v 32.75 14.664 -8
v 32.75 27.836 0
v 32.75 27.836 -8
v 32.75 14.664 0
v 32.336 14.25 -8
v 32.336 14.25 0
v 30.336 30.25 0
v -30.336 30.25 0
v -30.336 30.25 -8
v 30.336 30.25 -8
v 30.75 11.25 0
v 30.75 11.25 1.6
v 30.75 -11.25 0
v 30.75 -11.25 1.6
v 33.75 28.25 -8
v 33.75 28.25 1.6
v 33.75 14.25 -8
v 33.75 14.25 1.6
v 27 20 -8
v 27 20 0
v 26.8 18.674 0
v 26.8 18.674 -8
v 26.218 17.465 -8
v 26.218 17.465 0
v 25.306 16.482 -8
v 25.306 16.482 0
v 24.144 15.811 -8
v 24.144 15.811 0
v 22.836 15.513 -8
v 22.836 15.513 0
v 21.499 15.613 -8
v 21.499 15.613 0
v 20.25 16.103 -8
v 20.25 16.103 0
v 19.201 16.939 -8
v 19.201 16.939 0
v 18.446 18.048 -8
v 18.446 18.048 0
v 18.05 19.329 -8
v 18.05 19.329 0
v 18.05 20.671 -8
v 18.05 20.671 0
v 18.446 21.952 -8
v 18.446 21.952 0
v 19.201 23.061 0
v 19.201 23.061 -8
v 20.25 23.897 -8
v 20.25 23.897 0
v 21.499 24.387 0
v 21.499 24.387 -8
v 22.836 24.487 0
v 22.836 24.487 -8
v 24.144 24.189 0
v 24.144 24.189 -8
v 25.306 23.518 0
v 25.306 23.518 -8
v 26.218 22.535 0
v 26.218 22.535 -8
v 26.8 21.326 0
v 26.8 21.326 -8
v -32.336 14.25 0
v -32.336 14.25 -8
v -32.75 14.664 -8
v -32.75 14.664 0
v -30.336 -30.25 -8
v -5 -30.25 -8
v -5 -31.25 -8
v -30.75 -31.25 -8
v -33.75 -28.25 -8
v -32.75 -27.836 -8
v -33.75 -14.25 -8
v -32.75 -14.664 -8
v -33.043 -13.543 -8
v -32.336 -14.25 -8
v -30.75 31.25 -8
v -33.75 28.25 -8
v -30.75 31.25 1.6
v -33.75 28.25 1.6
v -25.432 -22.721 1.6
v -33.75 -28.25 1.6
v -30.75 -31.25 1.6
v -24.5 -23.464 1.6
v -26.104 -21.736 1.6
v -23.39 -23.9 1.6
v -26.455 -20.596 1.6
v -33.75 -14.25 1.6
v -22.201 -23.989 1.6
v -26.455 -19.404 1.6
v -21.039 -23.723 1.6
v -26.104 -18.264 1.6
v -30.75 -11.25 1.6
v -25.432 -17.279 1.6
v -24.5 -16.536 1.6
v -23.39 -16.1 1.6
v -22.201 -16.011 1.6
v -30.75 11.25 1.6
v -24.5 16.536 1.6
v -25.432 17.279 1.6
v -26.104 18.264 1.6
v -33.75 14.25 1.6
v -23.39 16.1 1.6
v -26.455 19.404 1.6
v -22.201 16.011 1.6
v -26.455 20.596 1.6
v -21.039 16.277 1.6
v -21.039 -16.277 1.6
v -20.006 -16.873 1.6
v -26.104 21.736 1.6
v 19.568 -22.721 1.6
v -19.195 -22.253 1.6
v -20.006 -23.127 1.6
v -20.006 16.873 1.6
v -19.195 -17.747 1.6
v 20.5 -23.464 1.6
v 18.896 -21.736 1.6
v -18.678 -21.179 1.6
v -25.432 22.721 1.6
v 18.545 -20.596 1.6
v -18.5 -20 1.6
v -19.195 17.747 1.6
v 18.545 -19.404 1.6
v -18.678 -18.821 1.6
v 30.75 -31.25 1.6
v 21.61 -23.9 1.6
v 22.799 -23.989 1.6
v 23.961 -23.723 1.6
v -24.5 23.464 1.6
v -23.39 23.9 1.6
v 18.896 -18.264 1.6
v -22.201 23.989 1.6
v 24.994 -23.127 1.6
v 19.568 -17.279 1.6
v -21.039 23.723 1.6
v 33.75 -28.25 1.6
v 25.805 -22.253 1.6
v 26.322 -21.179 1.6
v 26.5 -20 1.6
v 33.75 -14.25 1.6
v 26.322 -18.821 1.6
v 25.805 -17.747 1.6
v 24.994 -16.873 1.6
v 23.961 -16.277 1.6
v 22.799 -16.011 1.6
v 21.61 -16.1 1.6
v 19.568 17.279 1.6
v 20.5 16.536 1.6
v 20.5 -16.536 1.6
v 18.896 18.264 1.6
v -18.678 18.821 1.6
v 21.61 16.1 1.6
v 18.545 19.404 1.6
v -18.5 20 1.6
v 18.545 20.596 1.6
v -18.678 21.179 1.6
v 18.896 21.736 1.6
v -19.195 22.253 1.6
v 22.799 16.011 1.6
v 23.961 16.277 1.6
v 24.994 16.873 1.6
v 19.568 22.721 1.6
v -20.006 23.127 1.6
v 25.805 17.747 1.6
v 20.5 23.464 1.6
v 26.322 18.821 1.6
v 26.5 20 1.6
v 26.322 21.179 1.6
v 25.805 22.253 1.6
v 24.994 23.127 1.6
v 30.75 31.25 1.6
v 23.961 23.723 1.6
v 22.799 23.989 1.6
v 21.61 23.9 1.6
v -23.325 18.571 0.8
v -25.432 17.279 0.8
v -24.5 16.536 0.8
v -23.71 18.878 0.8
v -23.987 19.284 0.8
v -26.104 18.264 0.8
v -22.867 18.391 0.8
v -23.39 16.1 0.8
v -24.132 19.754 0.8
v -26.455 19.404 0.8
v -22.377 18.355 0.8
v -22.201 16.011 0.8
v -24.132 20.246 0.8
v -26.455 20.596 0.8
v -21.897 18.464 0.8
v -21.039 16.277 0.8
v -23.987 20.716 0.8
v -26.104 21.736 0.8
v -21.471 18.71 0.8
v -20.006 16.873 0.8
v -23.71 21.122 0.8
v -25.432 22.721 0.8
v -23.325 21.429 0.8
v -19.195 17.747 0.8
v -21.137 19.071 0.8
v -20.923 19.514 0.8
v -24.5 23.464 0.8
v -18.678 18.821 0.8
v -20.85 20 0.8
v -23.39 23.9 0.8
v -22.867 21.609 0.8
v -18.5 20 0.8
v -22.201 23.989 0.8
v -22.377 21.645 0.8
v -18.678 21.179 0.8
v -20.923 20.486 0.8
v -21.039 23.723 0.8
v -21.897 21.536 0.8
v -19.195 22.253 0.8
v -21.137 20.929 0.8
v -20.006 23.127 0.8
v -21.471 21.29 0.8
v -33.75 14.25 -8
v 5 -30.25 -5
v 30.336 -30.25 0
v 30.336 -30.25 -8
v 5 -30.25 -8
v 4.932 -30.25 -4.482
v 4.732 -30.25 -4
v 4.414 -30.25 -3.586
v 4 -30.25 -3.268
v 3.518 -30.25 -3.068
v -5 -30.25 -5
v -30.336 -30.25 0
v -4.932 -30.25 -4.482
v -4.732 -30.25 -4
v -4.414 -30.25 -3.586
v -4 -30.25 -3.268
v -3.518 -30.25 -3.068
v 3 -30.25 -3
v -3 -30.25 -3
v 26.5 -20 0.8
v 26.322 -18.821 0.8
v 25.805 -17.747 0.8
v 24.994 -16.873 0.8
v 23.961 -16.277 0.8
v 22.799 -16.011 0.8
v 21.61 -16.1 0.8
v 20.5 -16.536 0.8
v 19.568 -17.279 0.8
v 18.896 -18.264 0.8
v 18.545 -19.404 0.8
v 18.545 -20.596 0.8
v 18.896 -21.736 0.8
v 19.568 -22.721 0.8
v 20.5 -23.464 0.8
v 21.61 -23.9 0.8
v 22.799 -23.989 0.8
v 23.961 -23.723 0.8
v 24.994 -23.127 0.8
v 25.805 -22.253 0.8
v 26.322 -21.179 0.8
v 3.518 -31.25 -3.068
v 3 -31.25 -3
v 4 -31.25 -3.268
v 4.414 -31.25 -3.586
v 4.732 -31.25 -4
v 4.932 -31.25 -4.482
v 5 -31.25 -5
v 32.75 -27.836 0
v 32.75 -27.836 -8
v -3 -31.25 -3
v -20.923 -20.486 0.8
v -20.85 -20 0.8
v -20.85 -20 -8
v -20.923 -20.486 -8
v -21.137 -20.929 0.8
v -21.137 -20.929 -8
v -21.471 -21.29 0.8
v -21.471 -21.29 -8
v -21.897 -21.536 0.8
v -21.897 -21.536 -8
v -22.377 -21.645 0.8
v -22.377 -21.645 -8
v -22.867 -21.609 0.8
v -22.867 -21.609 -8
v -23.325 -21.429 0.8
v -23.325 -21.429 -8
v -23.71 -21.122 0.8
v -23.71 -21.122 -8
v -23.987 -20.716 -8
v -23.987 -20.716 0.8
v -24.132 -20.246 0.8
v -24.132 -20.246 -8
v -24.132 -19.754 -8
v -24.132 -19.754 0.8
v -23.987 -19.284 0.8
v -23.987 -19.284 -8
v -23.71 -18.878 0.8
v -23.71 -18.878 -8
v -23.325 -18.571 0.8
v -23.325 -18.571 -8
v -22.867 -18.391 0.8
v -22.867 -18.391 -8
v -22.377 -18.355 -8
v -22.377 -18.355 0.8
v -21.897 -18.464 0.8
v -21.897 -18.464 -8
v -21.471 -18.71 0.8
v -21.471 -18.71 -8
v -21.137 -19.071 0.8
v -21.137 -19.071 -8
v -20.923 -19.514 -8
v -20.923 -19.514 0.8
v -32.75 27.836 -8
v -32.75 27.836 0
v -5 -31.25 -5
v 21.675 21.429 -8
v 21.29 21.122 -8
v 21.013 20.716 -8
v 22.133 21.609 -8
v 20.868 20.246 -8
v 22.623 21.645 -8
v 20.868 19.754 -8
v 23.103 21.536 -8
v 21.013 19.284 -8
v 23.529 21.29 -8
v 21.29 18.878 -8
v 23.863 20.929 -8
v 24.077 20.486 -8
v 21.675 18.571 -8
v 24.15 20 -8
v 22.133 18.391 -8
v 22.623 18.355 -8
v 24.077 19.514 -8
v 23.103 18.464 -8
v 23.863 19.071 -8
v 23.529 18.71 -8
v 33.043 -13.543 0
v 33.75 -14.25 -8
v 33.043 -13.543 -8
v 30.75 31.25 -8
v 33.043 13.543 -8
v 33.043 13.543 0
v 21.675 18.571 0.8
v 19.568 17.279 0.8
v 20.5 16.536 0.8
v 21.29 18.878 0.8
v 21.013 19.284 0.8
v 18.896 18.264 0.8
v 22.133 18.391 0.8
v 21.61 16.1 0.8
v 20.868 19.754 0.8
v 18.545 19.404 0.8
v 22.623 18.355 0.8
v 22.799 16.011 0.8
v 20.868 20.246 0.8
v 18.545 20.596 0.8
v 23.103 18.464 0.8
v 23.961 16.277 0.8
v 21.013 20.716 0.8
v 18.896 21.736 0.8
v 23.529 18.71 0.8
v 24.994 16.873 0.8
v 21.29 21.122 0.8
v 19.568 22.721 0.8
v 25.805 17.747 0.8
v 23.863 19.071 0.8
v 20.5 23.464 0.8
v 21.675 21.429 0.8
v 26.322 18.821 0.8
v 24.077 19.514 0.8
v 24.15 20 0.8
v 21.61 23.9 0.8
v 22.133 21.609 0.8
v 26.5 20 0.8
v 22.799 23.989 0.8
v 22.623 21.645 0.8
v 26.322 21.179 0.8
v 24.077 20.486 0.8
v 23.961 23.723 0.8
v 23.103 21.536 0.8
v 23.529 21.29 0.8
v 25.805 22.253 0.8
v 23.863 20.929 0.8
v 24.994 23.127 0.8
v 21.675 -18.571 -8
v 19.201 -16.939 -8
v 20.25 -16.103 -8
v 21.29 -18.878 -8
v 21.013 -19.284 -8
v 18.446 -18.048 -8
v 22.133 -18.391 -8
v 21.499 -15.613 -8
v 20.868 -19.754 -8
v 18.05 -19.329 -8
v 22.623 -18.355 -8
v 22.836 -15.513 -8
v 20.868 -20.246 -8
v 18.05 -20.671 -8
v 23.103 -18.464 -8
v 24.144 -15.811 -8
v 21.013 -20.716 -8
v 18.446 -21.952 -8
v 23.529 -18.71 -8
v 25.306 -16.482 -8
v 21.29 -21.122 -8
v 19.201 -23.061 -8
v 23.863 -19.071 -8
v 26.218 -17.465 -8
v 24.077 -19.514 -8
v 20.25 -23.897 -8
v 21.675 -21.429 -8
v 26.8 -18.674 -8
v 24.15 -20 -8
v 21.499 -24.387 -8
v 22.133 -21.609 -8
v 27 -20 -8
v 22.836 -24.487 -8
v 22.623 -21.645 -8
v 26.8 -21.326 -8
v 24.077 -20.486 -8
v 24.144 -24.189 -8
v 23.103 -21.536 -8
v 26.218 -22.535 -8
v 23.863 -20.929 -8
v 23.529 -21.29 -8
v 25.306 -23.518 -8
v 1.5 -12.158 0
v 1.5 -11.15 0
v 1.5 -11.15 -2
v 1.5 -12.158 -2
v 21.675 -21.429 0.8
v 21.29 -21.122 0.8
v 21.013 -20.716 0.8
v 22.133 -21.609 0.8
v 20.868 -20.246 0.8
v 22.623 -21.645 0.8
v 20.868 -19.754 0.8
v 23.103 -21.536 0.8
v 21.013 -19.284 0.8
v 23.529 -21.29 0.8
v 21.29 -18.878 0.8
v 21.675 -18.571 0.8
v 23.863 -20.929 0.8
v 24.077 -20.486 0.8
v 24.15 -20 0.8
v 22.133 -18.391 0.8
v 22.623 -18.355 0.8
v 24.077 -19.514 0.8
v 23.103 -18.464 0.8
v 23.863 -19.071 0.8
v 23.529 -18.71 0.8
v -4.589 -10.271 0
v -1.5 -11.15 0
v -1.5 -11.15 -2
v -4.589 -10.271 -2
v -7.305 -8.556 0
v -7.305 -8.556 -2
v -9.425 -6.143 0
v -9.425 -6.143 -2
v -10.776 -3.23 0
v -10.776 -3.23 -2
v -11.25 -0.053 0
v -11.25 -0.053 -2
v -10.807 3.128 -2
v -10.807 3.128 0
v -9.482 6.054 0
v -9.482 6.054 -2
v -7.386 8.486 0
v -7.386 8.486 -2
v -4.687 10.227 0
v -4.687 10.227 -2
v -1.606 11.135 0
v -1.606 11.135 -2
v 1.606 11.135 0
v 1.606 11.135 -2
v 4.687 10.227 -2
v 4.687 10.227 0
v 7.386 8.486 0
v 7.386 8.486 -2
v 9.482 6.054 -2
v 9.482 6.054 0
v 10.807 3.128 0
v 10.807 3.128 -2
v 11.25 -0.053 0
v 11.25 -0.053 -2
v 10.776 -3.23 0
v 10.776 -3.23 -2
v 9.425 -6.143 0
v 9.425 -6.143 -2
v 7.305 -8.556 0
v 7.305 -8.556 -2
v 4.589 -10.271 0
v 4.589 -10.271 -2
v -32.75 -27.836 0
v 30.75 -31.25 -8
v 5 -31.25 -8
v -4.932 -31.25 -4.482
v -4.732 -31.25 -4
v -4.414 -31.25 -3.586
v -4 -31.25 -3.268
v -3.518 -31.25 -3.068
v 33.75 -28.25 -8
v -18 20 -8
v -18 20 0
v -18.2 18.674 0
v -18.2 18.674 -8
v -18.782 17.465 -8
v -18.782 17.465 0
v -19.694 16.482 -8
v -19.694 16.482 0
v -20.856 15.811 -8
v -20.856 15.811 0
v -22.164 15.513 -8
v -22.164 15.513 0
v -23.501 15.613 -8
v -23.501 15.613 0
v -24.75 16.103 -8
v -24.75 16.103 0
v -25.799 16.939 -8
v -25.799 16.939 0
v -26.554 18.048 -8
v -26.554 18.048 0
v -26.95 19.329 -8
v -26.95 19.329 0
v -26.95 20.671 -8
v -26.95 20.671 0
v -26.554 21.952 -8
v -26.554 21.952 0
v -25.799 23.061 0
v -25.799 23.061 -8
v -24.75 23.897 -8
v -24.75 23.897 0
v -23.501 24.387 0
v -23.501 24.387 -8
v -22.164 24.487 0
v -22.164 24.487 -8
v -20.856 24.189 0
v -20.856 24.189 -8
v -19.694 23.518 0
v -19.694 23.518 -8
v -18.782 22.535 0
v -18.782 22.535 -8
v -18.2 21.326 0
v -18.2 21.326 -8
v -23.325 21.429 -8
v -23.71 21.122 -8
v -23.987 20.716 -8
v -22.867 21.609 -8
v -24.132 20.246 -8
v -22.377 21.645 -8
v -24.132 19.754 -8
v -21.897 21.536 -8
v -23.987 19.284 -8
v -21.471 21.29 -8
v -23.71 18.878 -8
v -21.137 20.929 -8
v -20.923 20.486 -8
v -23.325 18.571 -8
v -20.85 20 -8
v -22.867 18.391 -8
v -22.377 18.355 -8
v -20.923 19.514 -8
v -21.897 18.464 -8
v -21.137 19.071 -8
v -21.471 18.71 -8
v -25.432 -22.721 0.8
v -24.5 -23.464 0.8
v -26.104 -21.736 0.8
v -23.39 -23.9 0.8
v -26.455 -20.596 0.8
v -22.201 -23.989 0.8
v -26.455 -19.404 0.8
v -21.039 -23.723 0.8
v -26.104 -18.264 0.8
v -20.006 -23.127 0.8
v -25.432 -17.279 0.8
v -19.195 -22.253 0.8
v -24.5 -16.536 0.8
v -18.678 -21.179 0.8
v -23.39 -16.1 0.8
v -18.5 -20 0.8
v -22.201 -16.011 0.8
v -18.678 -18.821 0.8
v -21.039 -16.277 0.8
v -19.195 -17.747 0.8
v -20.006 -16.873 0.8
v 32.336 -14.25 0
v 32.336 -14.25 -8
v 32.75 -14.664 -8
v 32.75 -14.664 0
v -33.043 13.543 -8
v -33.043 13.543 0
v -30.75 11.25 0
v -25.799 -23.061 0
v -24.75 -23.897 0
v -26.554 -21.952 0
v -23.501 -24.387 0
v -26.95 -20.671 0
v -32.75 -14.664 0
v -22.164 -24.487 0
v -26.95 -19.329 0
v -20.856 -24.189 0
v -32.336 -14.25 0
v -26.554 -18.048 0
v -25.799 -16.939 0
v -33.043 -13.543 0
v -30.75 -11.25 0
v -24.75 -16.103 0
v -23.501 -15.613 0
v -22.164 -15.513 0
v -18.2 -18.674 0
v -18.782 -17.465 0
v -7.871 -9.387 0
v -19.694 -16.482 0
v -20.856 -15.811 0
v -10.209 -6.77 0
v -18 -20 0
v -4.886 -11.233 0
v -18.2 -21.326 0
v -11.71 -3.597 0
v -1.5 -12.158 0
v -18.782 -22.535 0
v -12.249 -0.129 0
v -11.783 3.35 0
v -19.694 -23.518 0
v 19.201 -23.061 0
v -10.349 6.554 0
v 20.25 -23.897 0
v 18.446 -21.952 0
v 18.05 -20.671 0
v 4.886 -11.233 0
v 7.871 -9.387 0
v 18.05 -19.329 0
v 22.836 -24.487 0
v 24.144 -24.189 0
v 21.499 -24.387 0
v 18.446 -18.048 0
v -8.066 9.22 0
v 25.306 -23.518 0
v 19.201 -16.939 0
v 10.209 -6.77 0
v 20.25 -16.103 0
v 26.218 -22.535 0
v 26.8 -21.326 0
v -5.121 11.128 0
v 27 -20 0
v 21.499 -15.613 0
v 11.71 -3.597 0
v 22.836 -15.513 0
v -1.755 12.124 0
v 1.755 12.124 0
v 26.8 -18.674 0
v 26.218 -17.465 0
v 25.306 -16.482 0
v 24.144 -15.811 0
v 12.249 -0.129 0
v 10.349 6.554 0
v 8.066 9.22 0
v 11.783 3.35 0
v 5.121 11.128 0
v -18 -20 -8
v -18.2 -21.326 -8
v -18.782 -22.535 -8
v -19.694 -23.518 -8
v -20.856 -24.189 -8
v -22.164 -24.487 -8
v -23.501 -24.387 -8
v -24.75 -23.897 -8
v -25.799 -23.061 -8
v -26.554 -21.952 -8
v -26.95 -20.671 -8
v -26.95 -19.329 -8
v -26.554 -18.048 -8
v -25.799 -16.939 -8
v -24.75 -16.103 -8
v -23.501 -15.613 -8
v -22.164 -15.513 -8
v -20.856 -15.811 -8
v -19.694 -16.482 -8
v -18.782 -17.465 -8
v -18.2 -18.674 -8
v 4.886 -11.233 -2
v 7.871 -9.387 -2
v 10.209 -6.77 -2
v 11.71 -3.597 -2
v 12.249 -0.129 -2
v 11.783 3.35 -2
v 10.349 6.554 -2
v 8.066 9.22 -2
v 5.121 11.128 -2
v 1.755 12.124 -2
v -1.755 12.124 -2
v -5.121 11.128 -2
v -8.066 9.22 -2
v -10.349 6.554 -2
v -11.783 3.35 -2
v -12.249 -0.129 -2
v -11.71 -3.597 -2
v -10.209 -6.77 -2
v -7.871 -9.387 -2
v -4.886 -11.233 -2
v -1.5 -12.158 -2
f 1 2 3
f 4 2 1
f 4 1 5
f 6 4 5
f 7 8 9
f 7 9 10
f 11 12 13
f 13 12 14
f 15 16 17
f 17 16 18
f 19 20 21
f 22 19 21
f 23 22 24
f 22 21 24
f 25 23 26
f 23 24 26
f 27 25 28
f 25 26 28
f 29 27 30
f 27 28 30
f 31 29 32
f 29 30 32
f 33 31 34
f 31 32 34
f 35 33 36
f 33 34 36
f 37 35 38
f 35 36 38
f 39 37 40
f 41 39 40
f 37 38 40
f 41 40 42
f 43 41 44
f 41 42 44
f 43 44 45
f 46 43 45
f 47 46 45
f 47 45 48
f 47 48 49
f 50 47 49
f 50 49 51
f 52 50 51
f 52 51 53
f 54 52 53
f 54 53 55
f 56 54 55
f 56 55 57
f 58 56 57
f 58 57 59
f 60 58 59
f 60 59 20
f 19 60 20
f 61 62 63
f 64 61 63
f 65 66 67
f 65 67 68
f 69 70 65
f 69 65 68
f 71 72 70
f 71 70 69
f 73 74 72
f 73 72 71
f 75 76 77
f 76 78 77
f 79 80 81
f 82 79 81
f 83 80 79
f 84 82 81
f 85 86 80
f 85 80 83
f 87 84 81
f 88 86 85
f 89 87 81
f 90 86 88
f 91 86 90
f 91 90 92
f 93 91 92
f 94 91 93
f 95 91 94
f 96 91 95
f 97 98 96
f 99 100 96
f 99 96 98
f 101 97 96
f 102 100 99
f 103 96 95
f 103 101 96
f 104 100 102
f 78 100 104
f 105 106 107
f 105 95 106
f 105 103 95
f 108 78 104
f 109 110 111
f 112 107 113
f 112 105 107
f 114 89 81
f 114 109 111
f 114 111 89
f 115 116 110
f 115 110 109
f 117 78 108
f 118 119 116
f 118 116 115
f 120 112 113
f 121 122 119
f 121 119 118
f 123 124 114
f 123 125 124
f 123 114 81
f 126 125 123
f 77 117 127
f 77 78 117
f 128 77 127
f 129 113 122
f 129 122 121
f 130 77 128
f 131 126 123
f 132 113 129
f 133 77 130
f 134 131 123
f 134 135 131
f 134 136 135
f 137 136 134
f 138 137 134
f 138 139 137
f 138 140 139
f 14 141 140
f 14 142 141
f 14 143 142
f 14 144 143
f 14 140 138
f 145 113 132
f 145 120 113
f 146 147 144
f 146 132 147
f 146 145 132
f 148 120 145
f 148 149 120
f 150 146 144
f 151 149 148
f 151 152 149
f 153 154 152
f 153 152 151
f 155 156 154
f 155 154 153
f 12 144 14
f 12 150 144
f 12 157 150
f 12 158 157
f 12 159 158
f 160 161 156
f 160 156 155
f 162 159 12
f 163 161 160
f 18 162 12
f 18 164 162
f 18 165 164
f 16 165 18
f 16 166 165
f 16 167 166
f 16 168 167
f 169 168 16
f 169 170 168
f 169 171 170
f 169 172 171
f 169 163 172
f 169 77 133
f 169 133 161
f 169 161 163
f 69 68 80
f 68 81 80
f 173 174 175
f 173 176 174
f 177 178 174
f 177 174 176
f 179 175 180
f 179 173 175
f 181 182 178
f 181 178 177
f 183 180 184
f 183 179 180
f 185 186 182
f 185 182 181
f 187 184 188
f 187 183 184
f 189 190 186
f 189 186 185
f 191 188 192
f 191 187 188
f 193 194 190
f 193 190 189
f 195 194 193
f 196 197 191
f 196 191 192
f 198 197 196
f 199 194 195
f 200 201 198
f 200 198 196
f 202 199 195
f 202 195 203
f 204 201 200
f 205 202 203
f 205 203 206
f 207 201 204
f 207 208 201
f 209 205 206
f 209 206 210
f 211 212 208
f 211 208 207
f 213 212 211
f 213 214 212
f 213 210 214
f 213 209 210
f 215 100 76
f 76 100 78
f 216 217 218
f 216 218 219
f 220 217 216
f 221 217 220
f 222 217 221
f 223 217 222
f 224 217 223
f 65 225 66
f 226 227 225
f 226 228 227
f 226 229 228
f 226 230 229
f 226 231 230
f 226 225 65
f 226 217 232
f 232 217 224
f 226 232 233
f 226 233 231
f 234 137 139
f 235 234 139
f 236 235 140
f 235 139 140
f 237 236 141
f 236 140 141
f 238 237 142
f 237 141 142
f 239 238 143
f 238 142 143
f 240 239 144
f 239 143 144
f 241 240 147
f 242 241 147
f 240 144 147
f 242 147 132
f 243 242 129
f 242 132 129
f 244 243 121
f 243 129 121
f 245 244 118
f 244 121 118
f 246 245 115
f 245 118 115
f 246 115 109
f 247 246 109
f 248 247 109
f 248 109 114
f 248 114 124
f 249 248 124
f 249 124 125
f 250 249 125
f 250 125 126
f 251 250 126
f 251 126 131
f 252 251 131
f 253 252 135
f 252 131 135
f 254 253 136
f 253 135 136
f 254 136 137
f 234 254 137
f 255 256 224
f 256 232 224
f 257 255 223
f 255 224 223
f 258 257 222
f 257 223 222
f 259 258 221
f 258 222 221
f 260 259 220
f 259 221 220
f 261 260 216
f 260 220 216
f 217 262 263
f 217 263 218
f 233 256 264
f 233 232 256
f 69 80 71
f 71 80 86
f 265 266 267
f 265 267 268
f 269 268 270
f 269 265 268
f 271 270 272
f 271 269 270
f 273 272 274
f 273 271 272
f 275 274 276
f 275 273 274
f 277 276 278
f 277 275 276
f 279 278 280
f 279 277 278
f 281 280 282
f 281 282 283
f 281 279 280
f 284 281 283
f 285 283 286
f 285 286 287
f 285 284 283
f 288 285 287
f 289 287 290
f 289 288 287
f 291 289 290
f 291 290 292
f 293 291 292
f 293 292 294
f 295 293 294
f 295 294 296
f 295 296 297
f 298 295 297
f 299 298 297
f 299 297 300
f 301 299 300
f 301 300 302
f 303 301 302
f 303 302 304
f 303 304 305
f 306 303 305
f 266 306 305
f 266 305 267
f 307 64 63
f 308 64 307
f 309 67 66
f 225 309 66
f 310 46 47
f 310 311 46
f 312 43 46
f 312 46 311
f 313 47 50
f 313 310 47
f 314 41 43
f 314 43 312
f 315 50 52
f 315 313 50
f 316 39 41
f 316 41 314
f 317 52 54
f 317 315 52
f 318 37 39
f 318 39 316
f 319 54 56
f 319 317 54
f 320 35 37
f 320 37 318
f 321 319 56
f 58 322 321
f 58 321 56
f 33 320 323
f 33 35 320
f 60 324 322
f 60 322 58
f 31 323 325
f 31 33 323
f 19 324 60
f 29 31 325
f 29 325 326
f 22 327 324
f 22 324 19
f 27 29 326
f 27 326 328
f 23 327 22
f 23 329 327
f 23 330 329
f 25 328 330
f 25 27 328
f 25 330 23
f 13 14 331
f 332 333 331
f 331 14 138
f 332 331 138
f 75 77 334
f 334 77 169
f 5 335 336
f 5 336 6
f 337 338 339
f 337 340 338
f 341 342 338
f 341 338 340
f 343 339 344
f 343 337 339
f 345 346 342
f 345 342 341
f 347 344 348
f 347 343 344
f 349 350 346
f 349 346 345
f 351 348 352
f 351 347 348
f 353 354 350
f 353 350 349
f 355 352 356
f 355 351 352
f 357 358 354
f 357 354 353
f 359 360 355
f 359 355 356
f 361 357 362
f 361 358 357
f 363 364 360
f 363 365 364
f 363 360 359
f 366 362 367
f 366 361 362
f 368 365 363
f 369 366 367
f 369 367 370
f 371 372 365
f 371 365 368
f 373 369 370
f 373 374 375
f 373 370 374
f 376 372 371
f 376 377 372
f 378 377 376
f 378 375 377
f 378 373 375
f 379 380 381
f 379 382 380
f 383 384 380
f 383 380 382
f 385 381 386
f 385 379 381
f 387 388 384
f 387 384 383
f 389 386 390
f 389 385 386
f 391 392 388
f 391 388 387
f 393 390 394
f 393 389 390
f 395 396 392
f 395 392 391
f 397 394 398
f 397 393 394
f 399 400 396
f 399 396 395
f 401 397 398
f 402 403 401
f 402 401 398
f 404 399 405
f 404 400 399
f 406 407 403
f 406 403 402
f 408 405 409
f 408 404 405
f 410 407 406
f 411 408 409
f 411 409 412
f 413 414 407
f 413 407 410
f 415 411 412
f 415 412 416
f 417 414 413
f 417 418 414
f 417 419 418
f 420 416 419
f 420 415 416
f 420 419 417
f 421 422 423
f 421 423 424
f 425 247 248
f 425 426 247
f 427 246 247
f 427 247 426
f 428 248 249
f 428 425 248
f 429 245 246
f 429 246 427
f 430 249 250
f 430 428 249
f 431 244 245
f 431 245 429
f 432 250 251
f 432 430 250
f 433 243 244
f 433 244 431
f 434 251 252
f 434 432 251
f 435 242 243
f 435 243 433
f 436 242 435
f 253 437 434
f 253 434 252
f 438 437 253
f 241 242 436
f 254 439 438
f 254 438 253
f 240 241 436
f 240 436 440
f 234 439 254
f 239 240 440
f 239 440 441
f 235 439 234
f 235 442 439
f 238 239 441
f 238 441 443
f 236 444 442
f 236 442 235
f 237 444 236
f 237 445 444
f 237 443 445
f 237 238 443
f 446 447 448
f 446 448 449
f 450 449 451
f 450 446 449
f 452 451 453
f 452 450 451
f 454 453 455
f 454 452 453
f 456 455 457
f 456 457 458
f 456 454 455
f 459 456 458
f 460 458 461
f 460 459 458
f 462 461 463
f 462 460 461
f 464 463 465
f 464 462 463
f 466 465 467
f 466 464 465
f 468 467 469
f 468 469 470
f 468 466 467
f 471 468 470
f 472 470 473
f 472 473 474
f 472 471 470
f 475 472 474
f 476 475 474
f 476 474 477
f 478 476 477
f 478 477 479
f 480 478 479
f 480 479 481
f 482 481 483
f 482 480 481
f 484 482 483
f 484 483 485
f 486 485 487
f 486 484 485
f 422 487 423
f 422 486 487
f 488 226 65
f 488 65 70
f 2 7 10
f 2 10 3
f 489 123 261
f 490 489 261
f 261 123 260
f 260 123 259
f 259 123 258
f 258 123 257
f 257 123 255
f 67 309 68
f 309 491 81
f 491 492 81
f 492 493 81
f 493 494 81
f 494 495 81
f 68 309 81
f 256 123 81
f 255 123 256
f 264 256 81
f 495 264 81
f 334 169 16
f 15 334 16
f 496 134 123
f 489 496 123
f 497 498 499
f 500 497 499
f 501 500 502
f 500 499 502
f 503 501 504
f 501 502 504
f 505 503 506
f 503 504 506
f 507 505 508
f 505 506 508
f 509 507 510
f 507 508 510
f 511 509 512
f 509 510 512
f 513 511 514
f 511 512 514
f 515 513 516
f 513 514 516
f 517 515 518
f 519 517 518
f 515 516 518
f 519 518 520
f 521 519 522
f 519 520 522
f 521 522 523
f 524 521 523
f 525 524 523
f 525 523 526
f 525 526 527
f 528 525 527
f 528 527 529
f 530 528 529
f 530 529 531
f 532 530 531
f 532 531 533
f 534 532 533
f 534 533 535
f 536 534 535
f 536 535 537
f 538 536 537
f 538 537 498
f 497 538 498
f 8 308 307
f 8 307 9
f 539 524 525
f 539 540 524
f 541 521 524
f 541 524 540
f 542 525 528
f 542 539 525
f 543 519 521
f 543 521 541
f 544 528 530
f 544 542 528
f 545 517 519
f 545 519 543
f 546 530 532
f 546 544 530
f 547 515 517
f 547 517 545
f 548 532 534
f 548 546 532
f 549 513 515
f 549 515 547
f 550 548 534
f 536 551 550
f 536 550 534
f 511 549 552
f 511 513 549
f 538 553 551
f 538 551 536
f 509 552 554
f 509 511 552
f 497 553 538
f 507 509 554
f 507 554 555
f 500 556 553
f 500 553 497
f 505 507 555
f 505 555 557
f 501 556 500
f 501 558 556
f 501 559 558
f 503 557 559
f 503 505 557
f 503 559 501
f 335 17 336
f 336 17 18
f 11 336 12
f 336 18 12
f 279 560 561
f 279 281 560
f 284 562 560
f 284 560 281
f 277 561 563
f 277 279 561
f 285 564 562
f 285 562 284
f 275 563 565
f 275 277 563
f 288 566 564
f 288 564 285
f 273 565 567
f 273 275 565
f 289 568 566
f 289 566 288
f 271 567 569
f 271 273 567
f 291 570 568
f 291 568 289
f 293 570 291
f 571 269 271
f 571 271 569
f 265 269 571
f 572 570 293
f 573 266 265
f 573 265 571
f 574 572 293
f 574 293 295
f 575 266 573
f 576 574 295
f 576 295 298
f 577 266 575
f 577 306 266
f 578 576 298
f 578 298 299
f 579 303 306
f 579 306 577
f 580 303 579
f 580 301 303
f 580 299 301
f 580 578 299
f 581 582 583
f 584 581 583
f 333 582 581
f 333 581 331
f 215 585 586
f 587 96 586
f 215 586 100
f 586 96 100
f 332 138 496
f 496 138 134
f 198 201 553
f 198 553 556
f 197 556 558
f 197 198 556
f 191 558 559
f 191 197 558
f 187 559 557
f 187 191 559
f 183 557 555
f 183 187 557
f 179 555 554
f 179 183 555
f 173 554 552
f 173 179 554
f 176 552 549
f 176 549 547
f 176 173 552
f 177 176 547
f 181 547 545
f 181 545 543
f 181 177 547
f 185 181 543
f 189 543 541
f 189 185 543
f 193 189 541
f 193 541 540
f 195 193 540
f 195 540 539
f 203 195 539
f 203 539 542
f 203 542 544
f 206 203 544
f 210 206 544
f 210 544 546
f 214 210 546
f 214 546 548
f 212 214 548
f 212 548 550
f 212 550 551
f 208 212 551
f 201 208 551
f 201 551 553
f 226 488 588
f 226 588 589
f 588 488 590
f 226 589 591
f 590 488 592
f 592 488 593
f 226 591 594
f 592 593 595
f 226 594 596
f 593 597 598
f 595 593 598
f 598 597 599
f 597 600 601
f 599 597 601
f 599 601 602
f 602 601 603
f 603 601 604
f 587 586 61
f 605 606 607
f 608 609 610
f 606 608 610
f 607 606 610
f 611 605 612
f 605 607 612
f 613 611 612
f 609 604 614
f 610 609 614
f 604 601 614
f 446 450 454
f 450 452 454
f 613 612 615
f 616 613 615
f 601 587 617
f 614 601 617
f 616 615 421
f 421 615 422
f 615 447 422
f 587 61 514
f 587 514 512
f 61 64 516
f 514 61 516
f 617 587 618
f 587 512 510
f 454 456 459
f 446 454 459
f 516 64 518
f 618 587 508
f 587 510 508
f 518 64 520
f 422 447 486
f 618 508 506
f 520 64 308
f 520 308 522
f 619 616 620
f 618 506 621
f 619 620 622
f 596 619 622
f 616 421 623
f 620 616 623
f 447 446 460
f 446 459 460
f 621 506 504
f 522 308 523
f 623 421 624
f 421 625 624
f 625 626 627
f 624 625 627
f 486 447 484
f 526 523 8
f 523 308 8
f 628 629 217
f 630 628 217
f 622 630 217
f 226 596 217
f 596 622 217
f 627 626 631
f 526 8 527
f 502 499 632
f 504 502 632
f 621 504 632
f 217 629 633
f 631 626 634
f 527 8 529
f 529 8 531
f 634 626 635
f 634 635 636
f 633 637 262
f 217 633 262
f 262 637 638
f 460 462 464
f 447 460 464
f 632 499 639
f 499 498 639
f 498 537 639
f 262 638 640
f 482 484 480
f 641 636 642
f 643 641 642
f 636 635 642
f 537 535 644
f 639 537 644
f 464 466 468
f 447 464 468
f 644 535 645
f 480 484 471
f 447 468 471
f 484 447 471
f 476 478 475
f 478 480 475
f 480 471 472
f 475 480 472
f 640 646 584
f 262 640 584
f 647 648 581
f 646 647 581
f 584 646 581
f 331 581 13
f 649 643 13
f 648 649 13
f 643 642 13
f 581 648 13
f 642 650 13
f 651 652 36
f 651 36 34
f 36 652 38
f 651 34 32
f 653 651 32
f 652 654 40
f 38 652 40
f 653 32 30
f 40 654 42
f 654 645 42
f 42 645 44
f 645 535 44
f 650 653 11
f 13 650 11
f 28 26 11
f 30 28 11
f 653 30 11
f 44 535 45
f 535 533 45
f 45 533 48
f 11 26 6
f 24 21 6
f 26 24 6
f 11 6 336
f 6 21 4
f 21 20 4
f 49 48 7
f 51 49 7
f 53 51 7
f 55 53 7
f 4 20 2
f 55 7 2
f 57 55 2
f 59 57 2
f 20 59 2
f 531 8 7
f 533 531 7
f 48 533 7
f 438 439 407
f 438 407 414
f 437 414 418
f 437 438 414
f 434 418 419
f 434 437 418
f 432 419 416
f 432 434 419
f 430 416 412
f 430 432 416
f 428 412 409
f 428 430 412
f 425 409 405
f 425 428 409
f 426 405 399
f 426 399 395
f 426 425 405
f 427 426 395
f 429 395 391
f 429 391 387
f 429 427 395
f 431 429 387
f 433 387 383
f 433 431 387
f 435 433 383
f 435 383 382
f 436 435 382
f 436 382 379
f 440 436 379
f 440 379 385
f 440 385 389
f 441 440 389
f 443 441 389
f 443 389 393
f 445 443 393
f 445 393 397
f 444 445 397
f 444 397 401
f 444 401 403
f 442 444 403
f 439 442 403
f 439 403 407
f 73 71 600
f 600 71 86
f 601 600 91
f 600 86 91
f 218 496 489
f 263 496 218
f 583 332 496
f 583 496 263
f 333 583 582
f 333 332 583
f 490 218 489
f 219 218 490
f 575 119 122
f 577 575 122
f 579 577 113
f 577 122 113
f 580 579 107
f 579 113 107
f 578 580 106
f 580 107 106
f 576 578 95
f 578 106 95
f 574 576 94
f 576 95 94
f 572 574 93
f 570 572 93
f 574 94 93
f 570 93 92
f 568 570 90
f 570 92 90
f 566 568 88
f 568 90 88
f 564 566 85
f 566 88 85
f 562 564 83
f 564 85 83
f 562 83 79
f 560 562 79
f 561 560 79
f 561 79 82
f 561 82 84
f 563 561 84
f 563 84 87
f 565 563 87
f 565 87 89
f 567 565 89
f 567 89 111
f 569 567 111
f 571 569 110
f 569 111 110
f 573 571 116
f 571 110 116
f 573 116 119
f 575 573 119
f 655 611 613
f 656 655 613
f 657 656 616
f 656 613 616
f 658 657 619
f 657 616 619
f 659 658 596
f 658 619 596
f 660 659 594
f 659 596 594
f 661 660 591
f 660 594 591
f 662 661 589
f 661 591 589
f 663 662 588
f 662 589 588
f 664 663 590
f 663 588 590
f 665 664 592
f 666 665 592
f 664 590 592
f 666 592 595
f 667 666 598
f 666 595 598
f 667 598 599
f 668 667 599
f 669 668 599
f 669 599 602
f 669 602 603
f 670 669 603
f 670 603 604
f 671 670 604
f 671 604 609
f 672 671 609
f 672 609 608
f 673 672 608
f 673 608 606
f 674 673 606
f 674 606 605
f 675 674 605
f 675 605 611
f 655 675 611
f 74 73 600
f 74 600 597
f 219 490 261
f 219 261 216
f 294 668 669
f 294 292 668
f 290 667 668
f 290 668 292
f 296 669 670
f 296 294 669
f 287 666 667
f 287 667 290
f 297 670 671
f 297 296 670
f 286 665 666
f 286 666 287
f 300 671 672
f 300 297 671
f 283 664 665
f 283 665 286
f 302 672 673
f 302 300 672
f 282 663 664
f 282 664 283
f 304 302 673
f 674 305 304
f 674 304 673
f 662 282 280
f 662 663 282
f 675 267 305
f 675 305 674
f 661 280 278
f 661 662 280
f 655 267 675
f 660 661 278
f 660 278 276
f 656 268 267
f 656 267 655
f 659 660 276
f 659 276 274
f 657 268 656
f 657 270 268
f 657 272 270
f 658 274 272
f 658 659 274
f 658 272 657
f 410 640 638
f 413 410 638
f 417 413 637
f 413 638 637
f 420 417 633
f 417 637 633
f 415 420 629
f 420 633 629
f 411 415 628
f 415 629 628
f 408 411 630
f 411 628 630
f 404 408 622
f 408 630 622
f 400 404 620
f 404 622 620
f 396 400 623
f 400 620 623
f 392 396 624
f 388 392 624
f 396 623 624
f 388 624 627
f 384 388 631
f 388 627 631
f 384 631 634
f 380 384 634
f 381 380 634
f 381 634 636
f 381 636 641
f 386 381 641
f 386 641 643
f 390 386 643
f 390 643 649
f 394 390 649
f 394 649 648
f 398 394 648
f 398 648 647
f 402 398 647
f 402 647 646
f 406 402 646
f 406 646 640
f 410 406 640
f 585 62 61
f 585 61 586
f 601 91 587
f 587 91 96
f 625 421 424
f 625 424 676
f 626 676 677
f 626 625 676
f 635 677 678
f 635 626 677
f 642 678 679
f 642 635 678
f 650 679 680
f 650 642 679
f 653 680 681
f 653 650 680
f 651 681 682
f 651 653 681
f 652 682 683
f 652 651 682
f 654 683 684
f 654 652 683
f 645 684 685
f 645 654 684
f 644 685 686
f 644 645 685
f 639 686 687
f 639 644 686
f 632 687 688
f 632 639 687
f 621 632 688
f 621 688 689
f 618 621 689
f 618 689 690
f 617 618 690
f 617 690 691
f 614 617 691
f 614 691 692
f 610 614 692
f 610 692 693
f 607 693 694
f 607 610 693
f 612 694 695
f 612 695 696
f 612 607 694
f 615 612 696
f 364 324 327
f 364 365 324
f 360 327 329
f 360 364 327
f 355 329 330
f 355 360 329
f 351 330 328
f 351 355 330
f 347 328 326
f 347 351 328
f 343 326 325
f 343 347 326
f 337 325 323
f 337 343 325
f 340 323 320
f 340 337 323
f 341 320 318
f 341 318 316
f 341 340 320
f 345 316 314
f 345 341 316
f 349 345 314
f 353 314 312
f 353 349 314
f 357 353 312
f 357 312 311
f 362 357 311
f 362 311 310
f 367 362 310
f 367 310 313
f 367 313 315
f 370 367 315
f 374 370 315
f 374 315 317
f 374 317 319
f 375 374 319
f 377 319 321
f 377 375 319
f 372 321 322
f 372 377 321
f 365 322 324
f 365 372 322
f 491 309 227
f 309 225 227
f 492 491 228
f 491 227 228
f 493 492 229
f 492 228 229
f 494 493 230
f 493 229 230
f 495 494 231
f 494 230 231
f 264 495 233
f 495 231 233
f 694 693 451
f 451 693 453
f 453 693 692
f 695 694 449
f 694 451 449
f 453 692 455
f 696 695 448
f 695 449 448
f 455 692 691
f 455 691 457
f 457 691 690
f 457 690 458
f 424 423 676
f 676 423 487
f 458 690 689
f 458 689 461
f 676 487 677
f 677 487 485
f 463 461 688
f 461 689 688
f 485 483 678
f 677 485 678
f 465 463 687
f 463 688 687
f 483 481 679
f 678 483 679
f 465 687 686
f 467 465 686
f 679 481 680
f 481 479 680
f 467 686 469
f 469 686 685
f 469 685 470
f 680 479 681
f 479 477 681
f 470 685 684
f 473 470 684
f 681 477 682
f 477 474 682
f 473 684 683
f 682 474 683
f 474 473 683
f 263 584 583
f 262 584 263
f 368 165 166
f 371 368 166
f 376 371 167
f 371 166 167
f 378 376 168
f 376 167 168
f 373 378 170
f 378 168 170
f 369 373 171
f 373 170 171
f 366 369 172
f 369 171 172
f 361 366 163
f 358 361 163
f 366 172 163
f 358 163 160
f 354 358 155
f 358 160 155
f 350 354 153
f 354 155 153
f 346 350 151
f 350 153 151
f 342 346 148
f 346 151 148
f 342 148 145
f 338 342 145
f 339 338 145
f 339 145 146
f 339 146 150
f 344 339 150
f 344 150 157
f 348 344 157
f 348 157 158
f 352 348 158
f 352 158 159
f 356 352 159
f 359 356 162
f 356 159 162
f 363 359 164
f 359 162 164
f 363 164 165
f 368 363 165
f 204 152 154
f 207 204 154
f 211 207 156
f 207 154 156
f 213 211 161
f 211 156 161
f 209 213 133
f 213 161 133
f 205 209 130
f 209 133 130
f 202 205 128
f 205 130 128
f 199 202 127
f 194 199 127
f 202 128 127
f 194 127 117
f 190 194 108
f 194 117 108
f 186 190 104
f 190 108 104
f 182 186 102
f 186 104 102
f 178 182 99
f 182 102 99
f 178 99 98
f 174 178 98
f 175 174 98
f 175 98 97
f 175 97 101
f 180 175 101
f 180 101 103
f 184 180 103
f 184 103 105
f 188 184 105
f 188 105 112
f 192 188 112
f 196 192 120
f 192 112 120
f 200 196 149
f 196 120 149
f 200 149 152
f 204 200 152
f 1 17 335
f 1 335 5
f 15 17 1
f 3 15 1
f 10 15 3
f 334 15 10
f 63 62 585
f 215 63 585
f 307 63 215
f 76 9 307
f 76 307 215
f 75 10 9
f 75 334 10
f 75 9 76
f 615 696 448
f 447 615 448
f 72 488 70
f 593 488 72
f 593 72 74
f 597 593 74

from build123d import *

# Parameters (mm, degrees)
SKETCH_1_W           = 67.5
SKETCH_1_H           = 62.5
EXTRUDE_1_DEPTH      = 1.6
SKETCH_2_R           = 1.65
CUT_EXTRUDE_1_DEPTH  = 10
CHAMFER_1_SIZE       = 3
SKETCH_3_R           = 1.65
EXTRUDE_2_DEPTH      = 4
SKETCH_4_R           = 4
CUT_EXTRUDE_2_DEPTH  = 0.8
SKETCH_5_R           = 4.5
EXTRUDE_3_DEPTH      = 6
EXTRUDE_4_DEPTH      = 8
SKETCH_7_W           = 10
SKETCH_7_H           = 1
CUT_EXTRUDE_3_DEPTH  = 5
EXTRUDE_5_DEPTH      = 2
CUT_EXTRUDE_4_DEPTH  = 8
FILLET_2_R           = 2
EXTRUDE_7_DEPTH      = 2
EXTRUDE_7_DEPTH_BACK = 2
SKETCH_12_R          = 4.5
SKETCH_12_R_2        = 1.65


with BuildPart() as part:
    # 草图1 → 凸台-拉伸1 (new body)
    with BuildSketch(Plane.XY):
        Rectangle(SKETCH_1_W, SKETCH_1_H)
    extrude(amount=EXTRUDE_1_DEPTH)

    # 草图2 → 切除-拉伸1 (cut)
    with BuildSketch(Plane.XY.offset(1.6)):
        with Locations((-22.5, 20)):
            Circle(SKETCH_2_R)
        with Locations((22.5, 20)):
            Circle(SKETCH_2_R)
        with Locations((22.5, -20)):
            Circle(SKETCH_2_R)
        with Locations((-22.5, -20)):
            Circle(SKETCH_2_R)
        Polygon((-30.75, 11.25), (-30.75, -11.25), (-33.75, -14.25), (-33.75, 14.25), align=None)
        Polygon((30.75, 11.25), (30.75, -11.25), (33.75, -14.25), (33.75, 14.25), align=None)
    extrude(amount=-CUT_EXTRUDE_1_DEPTH, mode=Mode.SUBTRACT)

    # 倒角1
    chamfer_1_edges = [part.edges().sort_by_distance(p)[0] for p in [
        (33.75, -31.25, 0.8),
        (-33.75, -31.25, 0.8),
        (-33.75, 31.25, 0.8),
        (33.75, 31.25, 0.8),
    ]]
    chamfer(chamfer_1_edges, length=CHAMFER_1_SIZE)

    # 草图3 → 凸台-拉伸2 (add)
    # profile 1 of 4: a face of its own
    with BuildSketch(Plane(origin=(0, 0, 0), x_dir=(-1, 0, 0), z_dir=(0, 0, -1))):
        Polygon((-19.901923789, 20), (-21.200961894, 22.25), (-23.799038106, 22.25), (-25.098076211, 20), (-23.799038106, 17.75), (-21.200961894, 17.75), align=None)
        with Locations(Location((-22.5, 20, 0), (0, 0, 180))):
            Circle(SKETCH_3_R, mode=Mode.SUBTRACT)
    # profile 2 of 4: a face of its own
    with BuildSketch(Plane(origin=(0, 0, 0), x_dir=(-1, 0, 0), z_dir=(0, 0, -1))):
        Polygon((25.098076211, 20), (23.799038106, 22.25), (21.200961894, 22.25), (19.901923789, 20), (21.200961894, 17.75), (23.799038106, 17.75), align=None)
        with Locations(Location((22.5, 20, 0), (0, 0, 180))):
            Circle(SKETCH_3_R, mode=Mode.SUBTRACT)
    # profile 3 of 4: a face of its own
    with BuildSketch(Plane(origin=(0, 0, 0), x_dir=(-1, 0, 0), z_dir=(0, 0, -1))):
        Polygon((25.098076211, -20), (23.799038106, -17.75), (21.200961894, -17.75), (19.901923789, -20), (21.200961894, -22.25), (23.799038106, -22.25), align=None)
        with Locations(Location((22.5, -20, 0), (0, 0, 180))):
            Circle(SKETCH_3_R, mode=Mode.SUBTRACT)
    # profile 4 of 4: a face of its own
    with BuildSketch(Plane(origin=(0, 0, 0), x_dir=(-1, 0, 0), z_dir=(0, 0, -1))):
        Polygon((-19.901923789, -20), (-21.200961894, -17.75), (-23.799038106, -17.75), (-25.098076211, -20), (-23.799038106, -22.25), (-21.200961894, -22.25), align=None)
        with Locations(Location((-22.5, -20, 0), (0, 0, 180))):
            Circle(SKETCH_3_R, mode=Mode.SUBTRACT)
    extrude(amount=EXTRUDE_2_DEPTH)

    # 草图4 → 切除-拉伸2 (cut)
    with BuildSketch(Plane.XY.offset(1.6)):
        with Locations((-22.5, 20)):
            Circle(SKETCH_4_R)
        with Locations((22.5, 20)):
            Circle(SKETCH_4_R)
        with Locations((22.5, -20)):
            Circle(SKETCH_4_R)
        with Locations((-22.5, -20)):
            Circle(SKETCH_4_R)
    extrude(amount=-CUT_EXTRUDE_2_DEPTH, mode=Mode.SUBTRACT)

    # 草图5 → 凸台-拉伸3 (add)
    # profile 1 of 4: a face of its own
    with BuildSketch(Plane(origin=(0, 0, 0), x_dir=(-1, 0, 0), z_dir=(0, 0, -1))):
        with Locations(Location((-22.5, 20, 0), (0, 0, 180))):
            Circle(SKETCH_5_R)
        Polygon((-21.200961894, 17.75), (-19.901923789, 20), (-21.200961894, 22.25), (-23.799038106, 22.25), (-25.098076211, 20), (-23.799038106, 17.75), align=None, mode=Mode.SUBTRACT)
    # profile 2 of 4: a face of its own
    with BuildSketch(Plane(origin=(0, 0, 0), x_dir=(-1, 0, 0), z_dir=(0, 0, -1))):
        with Locations(Location((22.5, 20, 0), (0, 0, 180))):
            Circle(SKETCH_5_R)
        Polygon((23.799038106, 17.75), (25.098076211, 20), (23.799038106, 22.25), (21.200961894, 22.25), (19.901923789, 20), (21.200961894, 17.75), align=None, mode=Mode.SUBTRACT)
    # profile 3 of 4: a face of its own
    with BuildSketch(Plane(origin=(0, 0, 0), x_dir=(-1, 0, 0), z_dir=(0, 0, -1))):
        with Locations(Location((22.5, -20, 0), (0, 0, 180))):
            Circle(SKETCH_5_R)
        Polygon((23.799038106, -22.25), (25.098076211, -20), (23.799038106, -17.75), (21.200961894, -17.75), (19.901923789, -20), (21.200961894, -22.25), align=None, mode=Mode.SUBTRACT)
    # profile 4 of 4: a face of its own
    with BuildSketch(Plane(origin=(0, 0, 0), x_dir=(-1, 0, 0), z_dir=(0, 0, -1))):
        with Locations(Location((-22.5, -20, 0), (0, 0, 180))):
            Circle(SKETCH_5_R)
        Polygon((-21.200961894, -22.25), (-19.901923789, -20), (-21.200961894, -17.75), (-23.799038106, -17.75), (-25.098076211, -20), (-23.799038106, -22.25), align=None, mode=Mode.SUBTRACT)
    extrude(amount=EXTRUDE_3_DEPTH)

    # 草图6 → 凸台-拉伸4 (add)
    with BuildSketch(Plane(origin=(0, 0, 0), x_dir=(-1, 0, 0), z_dir=(0, 0, -1))):
        Polygon((-30.75, -31.25), (30.75, -31.25), (33.75, -28.25), (33.75, -14.25), (30.75, -11.25), (30.75, 11.25), (33.75, 14.25), (33.75, 28.25), (30.75, 31.25), (-30.75, 31.25), (-33.75, 28.25), (-33.75, 14.25), (-30.75, 11.25), (-30.75, -11.25), (-33.75, -14.25), (-33.75, -28.25), align=None)
        Polygon((-30.335786438, -30.25), (30.335786438, -30.25), (32.75, -27.835786438), (32.75, -14.664213562), (29.75, -11.664213562), (29.75, 11.664213562), (32.75, 14.664213562), (32.75, 27.835786438), (30.335786438, 30.25), (-30.335786438, 30.25), (-32.75, 27.835786438), (-32.75, 14.664213562), (-29.75, 11.664213562), (-29.75, -11.664213562), (-32.75, -14.664213562), (-32.75, -27.835786438), align=None, mode=Mode.SUBTRACT)
    extrude(amount=EXTRUDE_4_DEPTH)

    # 草图7 → 切除-拉伸3 (cut)
    with BuildSketch(Plane(origin=(0, 0, -8), x_dir=(-1, 0, 0), z_dir=(0, 0, -1))):
        with Locations((0, -30.75)):
            Rectangle(SKETCH_7_W, SKETCH_7_H)
    extrude(amount=-CUT_EXTRUDE_3_DEPTH, mode=Mode.SUBTRACT)

    # 草图8 → 凸台-拉伸5 (add)
    with BuildSketch(Plane(origin=(0, 0, 0), x_dir=(-1, 0, 0), z_dir=(0, 0, -1))):
        with BuildLine():
            Line((-1.5, -11.14955156), (-1.5, -12.157816416))
            ThreePointArc((-1.5, -12.157816416), (0, 12.25), (1.5, -12.157816416))
            Line((1.5, -12.157816416), (1.5, -11.14955156))
            ThreePointArc((1.5, -11.14955156), (0, 11.25), (-1.5, -11.14955156))
        make_face()
    extrude(amount=EXTRUDE_5_DEPTH)

    # 草图9 → 切除-拉伸4 (cut)
    with BuildSketch(Plane(origin=(0, 0, -8), x_dir=(-1, 0, 0), z_dir=(0, 0, -1))):
        Polygon((29.75, 11.664213562), (32.335786438, 14.25), (33.042893219, 13.542893219), (30.75, 11.25), (30.75, -11.25), (33.042893219, -13.542893219), (32.335786438, -14.25), (29.75, -11.664213562), align=None)
        Polygon((-33.042893219, 13.542893219), (-32.335786438, 14.25), (-29.75, 11.664213562), (-29.75, -11.664213562), (-32.335786438, -14.25), (-33.042893219, -13.542893219), (-30.75, -11.25), (-30.75, 11.25), align=None)
    extrude(amount=-CUT_EXTRUDE_4_DEPTH, mode=Mode.SUBTRACT)

    # 圆角2
    fillet_2_edges = [part.edges().sort_by_distance(p)[0] for p in [
        (5, -30.75, -3),
        (-5, -30.75, -3),
    ]]
    fillet(fillet_2_edges, radius=FILLET_2_R)

    # 草图12 → 凸台-拉伸7 (add, two sides: drawn at the far end of the back side and taken through both)
    # profile 1 of 4: a face of its own
    with BuildSketch(Plane(origin=(0, 0, -6), x_dir=(-1, 0, 0), z_dir=(0, 0, -1)).offset(-EXTRUDE_7_DEPTH_BACK)):
        with Locations(Location((-22.5, 20, 0), (0, 0, 180))):
            Circle(SKETCH_12_R)
        with Locations(Location((-22.5, 20, 0), (0, 0, 180))):
            Circle(SKETCH_12_R_2, mode=Mode.SUBTRACT)
    # profile 2 of 4: a face of its own
    with BuildSketch(Plane(origin=(0, 0, -6), x_dir=(-1, 0, 0), z_dir=(0, 0, -1)).offset(-EXTRUDE_7_DEPTH_BACK)):
        with Locations(Location((22.5, 20, 0), (0, 0, 180))):
            Circle(SKETCH_12_R)
        with Locations(Location((22.5, 20, 0), (0, 0, 180))):
            Circle(SKETCH_12_R_2, mode=Mode.SUBTRACT)
    # profile 3 of 4: a face of its own
    with BuildSketch(Plane(origin=(0, 0, -6), x_dir=(-1, 0, 0), z_dir=(0, 0, -1)).offset(-EXTRUDE_7_DEPTH_BACK)):
        with Locations(Location((-22.5, -20, 0), (0, 0, 180))):
            Circle(SKETCH_12_R)
        with Locations(Location((-22.5, -20, 0), (0, 0, 180))):
            Circle(SKETCH_12_R_2, mode=Mode.SUBTRACT)
    # profile 4 of 4: a face of its own
    with BuildSketch(Plane(origin=(0, 0, -6), x_dir=(-1, 0, 0), z_dir=(0, 0, -1)).offset(-EXTRUDE_7_DEPTH_BACK)):
        with Locations(Location((22.5, -20, 0), (0, 0, 180))):
            Circle(SKETCH_12_R)
        with Locations(Location((22.5, -20, 0), (0, 0, 180))):
            Circle(SKETCH_12_R_2, mode=Mode.SUBTRACT)
    extrude(amount=EXTRUDE_7_DEPTH + EXTRUDE_7_DEPTH_BACK)


solid = part.part
